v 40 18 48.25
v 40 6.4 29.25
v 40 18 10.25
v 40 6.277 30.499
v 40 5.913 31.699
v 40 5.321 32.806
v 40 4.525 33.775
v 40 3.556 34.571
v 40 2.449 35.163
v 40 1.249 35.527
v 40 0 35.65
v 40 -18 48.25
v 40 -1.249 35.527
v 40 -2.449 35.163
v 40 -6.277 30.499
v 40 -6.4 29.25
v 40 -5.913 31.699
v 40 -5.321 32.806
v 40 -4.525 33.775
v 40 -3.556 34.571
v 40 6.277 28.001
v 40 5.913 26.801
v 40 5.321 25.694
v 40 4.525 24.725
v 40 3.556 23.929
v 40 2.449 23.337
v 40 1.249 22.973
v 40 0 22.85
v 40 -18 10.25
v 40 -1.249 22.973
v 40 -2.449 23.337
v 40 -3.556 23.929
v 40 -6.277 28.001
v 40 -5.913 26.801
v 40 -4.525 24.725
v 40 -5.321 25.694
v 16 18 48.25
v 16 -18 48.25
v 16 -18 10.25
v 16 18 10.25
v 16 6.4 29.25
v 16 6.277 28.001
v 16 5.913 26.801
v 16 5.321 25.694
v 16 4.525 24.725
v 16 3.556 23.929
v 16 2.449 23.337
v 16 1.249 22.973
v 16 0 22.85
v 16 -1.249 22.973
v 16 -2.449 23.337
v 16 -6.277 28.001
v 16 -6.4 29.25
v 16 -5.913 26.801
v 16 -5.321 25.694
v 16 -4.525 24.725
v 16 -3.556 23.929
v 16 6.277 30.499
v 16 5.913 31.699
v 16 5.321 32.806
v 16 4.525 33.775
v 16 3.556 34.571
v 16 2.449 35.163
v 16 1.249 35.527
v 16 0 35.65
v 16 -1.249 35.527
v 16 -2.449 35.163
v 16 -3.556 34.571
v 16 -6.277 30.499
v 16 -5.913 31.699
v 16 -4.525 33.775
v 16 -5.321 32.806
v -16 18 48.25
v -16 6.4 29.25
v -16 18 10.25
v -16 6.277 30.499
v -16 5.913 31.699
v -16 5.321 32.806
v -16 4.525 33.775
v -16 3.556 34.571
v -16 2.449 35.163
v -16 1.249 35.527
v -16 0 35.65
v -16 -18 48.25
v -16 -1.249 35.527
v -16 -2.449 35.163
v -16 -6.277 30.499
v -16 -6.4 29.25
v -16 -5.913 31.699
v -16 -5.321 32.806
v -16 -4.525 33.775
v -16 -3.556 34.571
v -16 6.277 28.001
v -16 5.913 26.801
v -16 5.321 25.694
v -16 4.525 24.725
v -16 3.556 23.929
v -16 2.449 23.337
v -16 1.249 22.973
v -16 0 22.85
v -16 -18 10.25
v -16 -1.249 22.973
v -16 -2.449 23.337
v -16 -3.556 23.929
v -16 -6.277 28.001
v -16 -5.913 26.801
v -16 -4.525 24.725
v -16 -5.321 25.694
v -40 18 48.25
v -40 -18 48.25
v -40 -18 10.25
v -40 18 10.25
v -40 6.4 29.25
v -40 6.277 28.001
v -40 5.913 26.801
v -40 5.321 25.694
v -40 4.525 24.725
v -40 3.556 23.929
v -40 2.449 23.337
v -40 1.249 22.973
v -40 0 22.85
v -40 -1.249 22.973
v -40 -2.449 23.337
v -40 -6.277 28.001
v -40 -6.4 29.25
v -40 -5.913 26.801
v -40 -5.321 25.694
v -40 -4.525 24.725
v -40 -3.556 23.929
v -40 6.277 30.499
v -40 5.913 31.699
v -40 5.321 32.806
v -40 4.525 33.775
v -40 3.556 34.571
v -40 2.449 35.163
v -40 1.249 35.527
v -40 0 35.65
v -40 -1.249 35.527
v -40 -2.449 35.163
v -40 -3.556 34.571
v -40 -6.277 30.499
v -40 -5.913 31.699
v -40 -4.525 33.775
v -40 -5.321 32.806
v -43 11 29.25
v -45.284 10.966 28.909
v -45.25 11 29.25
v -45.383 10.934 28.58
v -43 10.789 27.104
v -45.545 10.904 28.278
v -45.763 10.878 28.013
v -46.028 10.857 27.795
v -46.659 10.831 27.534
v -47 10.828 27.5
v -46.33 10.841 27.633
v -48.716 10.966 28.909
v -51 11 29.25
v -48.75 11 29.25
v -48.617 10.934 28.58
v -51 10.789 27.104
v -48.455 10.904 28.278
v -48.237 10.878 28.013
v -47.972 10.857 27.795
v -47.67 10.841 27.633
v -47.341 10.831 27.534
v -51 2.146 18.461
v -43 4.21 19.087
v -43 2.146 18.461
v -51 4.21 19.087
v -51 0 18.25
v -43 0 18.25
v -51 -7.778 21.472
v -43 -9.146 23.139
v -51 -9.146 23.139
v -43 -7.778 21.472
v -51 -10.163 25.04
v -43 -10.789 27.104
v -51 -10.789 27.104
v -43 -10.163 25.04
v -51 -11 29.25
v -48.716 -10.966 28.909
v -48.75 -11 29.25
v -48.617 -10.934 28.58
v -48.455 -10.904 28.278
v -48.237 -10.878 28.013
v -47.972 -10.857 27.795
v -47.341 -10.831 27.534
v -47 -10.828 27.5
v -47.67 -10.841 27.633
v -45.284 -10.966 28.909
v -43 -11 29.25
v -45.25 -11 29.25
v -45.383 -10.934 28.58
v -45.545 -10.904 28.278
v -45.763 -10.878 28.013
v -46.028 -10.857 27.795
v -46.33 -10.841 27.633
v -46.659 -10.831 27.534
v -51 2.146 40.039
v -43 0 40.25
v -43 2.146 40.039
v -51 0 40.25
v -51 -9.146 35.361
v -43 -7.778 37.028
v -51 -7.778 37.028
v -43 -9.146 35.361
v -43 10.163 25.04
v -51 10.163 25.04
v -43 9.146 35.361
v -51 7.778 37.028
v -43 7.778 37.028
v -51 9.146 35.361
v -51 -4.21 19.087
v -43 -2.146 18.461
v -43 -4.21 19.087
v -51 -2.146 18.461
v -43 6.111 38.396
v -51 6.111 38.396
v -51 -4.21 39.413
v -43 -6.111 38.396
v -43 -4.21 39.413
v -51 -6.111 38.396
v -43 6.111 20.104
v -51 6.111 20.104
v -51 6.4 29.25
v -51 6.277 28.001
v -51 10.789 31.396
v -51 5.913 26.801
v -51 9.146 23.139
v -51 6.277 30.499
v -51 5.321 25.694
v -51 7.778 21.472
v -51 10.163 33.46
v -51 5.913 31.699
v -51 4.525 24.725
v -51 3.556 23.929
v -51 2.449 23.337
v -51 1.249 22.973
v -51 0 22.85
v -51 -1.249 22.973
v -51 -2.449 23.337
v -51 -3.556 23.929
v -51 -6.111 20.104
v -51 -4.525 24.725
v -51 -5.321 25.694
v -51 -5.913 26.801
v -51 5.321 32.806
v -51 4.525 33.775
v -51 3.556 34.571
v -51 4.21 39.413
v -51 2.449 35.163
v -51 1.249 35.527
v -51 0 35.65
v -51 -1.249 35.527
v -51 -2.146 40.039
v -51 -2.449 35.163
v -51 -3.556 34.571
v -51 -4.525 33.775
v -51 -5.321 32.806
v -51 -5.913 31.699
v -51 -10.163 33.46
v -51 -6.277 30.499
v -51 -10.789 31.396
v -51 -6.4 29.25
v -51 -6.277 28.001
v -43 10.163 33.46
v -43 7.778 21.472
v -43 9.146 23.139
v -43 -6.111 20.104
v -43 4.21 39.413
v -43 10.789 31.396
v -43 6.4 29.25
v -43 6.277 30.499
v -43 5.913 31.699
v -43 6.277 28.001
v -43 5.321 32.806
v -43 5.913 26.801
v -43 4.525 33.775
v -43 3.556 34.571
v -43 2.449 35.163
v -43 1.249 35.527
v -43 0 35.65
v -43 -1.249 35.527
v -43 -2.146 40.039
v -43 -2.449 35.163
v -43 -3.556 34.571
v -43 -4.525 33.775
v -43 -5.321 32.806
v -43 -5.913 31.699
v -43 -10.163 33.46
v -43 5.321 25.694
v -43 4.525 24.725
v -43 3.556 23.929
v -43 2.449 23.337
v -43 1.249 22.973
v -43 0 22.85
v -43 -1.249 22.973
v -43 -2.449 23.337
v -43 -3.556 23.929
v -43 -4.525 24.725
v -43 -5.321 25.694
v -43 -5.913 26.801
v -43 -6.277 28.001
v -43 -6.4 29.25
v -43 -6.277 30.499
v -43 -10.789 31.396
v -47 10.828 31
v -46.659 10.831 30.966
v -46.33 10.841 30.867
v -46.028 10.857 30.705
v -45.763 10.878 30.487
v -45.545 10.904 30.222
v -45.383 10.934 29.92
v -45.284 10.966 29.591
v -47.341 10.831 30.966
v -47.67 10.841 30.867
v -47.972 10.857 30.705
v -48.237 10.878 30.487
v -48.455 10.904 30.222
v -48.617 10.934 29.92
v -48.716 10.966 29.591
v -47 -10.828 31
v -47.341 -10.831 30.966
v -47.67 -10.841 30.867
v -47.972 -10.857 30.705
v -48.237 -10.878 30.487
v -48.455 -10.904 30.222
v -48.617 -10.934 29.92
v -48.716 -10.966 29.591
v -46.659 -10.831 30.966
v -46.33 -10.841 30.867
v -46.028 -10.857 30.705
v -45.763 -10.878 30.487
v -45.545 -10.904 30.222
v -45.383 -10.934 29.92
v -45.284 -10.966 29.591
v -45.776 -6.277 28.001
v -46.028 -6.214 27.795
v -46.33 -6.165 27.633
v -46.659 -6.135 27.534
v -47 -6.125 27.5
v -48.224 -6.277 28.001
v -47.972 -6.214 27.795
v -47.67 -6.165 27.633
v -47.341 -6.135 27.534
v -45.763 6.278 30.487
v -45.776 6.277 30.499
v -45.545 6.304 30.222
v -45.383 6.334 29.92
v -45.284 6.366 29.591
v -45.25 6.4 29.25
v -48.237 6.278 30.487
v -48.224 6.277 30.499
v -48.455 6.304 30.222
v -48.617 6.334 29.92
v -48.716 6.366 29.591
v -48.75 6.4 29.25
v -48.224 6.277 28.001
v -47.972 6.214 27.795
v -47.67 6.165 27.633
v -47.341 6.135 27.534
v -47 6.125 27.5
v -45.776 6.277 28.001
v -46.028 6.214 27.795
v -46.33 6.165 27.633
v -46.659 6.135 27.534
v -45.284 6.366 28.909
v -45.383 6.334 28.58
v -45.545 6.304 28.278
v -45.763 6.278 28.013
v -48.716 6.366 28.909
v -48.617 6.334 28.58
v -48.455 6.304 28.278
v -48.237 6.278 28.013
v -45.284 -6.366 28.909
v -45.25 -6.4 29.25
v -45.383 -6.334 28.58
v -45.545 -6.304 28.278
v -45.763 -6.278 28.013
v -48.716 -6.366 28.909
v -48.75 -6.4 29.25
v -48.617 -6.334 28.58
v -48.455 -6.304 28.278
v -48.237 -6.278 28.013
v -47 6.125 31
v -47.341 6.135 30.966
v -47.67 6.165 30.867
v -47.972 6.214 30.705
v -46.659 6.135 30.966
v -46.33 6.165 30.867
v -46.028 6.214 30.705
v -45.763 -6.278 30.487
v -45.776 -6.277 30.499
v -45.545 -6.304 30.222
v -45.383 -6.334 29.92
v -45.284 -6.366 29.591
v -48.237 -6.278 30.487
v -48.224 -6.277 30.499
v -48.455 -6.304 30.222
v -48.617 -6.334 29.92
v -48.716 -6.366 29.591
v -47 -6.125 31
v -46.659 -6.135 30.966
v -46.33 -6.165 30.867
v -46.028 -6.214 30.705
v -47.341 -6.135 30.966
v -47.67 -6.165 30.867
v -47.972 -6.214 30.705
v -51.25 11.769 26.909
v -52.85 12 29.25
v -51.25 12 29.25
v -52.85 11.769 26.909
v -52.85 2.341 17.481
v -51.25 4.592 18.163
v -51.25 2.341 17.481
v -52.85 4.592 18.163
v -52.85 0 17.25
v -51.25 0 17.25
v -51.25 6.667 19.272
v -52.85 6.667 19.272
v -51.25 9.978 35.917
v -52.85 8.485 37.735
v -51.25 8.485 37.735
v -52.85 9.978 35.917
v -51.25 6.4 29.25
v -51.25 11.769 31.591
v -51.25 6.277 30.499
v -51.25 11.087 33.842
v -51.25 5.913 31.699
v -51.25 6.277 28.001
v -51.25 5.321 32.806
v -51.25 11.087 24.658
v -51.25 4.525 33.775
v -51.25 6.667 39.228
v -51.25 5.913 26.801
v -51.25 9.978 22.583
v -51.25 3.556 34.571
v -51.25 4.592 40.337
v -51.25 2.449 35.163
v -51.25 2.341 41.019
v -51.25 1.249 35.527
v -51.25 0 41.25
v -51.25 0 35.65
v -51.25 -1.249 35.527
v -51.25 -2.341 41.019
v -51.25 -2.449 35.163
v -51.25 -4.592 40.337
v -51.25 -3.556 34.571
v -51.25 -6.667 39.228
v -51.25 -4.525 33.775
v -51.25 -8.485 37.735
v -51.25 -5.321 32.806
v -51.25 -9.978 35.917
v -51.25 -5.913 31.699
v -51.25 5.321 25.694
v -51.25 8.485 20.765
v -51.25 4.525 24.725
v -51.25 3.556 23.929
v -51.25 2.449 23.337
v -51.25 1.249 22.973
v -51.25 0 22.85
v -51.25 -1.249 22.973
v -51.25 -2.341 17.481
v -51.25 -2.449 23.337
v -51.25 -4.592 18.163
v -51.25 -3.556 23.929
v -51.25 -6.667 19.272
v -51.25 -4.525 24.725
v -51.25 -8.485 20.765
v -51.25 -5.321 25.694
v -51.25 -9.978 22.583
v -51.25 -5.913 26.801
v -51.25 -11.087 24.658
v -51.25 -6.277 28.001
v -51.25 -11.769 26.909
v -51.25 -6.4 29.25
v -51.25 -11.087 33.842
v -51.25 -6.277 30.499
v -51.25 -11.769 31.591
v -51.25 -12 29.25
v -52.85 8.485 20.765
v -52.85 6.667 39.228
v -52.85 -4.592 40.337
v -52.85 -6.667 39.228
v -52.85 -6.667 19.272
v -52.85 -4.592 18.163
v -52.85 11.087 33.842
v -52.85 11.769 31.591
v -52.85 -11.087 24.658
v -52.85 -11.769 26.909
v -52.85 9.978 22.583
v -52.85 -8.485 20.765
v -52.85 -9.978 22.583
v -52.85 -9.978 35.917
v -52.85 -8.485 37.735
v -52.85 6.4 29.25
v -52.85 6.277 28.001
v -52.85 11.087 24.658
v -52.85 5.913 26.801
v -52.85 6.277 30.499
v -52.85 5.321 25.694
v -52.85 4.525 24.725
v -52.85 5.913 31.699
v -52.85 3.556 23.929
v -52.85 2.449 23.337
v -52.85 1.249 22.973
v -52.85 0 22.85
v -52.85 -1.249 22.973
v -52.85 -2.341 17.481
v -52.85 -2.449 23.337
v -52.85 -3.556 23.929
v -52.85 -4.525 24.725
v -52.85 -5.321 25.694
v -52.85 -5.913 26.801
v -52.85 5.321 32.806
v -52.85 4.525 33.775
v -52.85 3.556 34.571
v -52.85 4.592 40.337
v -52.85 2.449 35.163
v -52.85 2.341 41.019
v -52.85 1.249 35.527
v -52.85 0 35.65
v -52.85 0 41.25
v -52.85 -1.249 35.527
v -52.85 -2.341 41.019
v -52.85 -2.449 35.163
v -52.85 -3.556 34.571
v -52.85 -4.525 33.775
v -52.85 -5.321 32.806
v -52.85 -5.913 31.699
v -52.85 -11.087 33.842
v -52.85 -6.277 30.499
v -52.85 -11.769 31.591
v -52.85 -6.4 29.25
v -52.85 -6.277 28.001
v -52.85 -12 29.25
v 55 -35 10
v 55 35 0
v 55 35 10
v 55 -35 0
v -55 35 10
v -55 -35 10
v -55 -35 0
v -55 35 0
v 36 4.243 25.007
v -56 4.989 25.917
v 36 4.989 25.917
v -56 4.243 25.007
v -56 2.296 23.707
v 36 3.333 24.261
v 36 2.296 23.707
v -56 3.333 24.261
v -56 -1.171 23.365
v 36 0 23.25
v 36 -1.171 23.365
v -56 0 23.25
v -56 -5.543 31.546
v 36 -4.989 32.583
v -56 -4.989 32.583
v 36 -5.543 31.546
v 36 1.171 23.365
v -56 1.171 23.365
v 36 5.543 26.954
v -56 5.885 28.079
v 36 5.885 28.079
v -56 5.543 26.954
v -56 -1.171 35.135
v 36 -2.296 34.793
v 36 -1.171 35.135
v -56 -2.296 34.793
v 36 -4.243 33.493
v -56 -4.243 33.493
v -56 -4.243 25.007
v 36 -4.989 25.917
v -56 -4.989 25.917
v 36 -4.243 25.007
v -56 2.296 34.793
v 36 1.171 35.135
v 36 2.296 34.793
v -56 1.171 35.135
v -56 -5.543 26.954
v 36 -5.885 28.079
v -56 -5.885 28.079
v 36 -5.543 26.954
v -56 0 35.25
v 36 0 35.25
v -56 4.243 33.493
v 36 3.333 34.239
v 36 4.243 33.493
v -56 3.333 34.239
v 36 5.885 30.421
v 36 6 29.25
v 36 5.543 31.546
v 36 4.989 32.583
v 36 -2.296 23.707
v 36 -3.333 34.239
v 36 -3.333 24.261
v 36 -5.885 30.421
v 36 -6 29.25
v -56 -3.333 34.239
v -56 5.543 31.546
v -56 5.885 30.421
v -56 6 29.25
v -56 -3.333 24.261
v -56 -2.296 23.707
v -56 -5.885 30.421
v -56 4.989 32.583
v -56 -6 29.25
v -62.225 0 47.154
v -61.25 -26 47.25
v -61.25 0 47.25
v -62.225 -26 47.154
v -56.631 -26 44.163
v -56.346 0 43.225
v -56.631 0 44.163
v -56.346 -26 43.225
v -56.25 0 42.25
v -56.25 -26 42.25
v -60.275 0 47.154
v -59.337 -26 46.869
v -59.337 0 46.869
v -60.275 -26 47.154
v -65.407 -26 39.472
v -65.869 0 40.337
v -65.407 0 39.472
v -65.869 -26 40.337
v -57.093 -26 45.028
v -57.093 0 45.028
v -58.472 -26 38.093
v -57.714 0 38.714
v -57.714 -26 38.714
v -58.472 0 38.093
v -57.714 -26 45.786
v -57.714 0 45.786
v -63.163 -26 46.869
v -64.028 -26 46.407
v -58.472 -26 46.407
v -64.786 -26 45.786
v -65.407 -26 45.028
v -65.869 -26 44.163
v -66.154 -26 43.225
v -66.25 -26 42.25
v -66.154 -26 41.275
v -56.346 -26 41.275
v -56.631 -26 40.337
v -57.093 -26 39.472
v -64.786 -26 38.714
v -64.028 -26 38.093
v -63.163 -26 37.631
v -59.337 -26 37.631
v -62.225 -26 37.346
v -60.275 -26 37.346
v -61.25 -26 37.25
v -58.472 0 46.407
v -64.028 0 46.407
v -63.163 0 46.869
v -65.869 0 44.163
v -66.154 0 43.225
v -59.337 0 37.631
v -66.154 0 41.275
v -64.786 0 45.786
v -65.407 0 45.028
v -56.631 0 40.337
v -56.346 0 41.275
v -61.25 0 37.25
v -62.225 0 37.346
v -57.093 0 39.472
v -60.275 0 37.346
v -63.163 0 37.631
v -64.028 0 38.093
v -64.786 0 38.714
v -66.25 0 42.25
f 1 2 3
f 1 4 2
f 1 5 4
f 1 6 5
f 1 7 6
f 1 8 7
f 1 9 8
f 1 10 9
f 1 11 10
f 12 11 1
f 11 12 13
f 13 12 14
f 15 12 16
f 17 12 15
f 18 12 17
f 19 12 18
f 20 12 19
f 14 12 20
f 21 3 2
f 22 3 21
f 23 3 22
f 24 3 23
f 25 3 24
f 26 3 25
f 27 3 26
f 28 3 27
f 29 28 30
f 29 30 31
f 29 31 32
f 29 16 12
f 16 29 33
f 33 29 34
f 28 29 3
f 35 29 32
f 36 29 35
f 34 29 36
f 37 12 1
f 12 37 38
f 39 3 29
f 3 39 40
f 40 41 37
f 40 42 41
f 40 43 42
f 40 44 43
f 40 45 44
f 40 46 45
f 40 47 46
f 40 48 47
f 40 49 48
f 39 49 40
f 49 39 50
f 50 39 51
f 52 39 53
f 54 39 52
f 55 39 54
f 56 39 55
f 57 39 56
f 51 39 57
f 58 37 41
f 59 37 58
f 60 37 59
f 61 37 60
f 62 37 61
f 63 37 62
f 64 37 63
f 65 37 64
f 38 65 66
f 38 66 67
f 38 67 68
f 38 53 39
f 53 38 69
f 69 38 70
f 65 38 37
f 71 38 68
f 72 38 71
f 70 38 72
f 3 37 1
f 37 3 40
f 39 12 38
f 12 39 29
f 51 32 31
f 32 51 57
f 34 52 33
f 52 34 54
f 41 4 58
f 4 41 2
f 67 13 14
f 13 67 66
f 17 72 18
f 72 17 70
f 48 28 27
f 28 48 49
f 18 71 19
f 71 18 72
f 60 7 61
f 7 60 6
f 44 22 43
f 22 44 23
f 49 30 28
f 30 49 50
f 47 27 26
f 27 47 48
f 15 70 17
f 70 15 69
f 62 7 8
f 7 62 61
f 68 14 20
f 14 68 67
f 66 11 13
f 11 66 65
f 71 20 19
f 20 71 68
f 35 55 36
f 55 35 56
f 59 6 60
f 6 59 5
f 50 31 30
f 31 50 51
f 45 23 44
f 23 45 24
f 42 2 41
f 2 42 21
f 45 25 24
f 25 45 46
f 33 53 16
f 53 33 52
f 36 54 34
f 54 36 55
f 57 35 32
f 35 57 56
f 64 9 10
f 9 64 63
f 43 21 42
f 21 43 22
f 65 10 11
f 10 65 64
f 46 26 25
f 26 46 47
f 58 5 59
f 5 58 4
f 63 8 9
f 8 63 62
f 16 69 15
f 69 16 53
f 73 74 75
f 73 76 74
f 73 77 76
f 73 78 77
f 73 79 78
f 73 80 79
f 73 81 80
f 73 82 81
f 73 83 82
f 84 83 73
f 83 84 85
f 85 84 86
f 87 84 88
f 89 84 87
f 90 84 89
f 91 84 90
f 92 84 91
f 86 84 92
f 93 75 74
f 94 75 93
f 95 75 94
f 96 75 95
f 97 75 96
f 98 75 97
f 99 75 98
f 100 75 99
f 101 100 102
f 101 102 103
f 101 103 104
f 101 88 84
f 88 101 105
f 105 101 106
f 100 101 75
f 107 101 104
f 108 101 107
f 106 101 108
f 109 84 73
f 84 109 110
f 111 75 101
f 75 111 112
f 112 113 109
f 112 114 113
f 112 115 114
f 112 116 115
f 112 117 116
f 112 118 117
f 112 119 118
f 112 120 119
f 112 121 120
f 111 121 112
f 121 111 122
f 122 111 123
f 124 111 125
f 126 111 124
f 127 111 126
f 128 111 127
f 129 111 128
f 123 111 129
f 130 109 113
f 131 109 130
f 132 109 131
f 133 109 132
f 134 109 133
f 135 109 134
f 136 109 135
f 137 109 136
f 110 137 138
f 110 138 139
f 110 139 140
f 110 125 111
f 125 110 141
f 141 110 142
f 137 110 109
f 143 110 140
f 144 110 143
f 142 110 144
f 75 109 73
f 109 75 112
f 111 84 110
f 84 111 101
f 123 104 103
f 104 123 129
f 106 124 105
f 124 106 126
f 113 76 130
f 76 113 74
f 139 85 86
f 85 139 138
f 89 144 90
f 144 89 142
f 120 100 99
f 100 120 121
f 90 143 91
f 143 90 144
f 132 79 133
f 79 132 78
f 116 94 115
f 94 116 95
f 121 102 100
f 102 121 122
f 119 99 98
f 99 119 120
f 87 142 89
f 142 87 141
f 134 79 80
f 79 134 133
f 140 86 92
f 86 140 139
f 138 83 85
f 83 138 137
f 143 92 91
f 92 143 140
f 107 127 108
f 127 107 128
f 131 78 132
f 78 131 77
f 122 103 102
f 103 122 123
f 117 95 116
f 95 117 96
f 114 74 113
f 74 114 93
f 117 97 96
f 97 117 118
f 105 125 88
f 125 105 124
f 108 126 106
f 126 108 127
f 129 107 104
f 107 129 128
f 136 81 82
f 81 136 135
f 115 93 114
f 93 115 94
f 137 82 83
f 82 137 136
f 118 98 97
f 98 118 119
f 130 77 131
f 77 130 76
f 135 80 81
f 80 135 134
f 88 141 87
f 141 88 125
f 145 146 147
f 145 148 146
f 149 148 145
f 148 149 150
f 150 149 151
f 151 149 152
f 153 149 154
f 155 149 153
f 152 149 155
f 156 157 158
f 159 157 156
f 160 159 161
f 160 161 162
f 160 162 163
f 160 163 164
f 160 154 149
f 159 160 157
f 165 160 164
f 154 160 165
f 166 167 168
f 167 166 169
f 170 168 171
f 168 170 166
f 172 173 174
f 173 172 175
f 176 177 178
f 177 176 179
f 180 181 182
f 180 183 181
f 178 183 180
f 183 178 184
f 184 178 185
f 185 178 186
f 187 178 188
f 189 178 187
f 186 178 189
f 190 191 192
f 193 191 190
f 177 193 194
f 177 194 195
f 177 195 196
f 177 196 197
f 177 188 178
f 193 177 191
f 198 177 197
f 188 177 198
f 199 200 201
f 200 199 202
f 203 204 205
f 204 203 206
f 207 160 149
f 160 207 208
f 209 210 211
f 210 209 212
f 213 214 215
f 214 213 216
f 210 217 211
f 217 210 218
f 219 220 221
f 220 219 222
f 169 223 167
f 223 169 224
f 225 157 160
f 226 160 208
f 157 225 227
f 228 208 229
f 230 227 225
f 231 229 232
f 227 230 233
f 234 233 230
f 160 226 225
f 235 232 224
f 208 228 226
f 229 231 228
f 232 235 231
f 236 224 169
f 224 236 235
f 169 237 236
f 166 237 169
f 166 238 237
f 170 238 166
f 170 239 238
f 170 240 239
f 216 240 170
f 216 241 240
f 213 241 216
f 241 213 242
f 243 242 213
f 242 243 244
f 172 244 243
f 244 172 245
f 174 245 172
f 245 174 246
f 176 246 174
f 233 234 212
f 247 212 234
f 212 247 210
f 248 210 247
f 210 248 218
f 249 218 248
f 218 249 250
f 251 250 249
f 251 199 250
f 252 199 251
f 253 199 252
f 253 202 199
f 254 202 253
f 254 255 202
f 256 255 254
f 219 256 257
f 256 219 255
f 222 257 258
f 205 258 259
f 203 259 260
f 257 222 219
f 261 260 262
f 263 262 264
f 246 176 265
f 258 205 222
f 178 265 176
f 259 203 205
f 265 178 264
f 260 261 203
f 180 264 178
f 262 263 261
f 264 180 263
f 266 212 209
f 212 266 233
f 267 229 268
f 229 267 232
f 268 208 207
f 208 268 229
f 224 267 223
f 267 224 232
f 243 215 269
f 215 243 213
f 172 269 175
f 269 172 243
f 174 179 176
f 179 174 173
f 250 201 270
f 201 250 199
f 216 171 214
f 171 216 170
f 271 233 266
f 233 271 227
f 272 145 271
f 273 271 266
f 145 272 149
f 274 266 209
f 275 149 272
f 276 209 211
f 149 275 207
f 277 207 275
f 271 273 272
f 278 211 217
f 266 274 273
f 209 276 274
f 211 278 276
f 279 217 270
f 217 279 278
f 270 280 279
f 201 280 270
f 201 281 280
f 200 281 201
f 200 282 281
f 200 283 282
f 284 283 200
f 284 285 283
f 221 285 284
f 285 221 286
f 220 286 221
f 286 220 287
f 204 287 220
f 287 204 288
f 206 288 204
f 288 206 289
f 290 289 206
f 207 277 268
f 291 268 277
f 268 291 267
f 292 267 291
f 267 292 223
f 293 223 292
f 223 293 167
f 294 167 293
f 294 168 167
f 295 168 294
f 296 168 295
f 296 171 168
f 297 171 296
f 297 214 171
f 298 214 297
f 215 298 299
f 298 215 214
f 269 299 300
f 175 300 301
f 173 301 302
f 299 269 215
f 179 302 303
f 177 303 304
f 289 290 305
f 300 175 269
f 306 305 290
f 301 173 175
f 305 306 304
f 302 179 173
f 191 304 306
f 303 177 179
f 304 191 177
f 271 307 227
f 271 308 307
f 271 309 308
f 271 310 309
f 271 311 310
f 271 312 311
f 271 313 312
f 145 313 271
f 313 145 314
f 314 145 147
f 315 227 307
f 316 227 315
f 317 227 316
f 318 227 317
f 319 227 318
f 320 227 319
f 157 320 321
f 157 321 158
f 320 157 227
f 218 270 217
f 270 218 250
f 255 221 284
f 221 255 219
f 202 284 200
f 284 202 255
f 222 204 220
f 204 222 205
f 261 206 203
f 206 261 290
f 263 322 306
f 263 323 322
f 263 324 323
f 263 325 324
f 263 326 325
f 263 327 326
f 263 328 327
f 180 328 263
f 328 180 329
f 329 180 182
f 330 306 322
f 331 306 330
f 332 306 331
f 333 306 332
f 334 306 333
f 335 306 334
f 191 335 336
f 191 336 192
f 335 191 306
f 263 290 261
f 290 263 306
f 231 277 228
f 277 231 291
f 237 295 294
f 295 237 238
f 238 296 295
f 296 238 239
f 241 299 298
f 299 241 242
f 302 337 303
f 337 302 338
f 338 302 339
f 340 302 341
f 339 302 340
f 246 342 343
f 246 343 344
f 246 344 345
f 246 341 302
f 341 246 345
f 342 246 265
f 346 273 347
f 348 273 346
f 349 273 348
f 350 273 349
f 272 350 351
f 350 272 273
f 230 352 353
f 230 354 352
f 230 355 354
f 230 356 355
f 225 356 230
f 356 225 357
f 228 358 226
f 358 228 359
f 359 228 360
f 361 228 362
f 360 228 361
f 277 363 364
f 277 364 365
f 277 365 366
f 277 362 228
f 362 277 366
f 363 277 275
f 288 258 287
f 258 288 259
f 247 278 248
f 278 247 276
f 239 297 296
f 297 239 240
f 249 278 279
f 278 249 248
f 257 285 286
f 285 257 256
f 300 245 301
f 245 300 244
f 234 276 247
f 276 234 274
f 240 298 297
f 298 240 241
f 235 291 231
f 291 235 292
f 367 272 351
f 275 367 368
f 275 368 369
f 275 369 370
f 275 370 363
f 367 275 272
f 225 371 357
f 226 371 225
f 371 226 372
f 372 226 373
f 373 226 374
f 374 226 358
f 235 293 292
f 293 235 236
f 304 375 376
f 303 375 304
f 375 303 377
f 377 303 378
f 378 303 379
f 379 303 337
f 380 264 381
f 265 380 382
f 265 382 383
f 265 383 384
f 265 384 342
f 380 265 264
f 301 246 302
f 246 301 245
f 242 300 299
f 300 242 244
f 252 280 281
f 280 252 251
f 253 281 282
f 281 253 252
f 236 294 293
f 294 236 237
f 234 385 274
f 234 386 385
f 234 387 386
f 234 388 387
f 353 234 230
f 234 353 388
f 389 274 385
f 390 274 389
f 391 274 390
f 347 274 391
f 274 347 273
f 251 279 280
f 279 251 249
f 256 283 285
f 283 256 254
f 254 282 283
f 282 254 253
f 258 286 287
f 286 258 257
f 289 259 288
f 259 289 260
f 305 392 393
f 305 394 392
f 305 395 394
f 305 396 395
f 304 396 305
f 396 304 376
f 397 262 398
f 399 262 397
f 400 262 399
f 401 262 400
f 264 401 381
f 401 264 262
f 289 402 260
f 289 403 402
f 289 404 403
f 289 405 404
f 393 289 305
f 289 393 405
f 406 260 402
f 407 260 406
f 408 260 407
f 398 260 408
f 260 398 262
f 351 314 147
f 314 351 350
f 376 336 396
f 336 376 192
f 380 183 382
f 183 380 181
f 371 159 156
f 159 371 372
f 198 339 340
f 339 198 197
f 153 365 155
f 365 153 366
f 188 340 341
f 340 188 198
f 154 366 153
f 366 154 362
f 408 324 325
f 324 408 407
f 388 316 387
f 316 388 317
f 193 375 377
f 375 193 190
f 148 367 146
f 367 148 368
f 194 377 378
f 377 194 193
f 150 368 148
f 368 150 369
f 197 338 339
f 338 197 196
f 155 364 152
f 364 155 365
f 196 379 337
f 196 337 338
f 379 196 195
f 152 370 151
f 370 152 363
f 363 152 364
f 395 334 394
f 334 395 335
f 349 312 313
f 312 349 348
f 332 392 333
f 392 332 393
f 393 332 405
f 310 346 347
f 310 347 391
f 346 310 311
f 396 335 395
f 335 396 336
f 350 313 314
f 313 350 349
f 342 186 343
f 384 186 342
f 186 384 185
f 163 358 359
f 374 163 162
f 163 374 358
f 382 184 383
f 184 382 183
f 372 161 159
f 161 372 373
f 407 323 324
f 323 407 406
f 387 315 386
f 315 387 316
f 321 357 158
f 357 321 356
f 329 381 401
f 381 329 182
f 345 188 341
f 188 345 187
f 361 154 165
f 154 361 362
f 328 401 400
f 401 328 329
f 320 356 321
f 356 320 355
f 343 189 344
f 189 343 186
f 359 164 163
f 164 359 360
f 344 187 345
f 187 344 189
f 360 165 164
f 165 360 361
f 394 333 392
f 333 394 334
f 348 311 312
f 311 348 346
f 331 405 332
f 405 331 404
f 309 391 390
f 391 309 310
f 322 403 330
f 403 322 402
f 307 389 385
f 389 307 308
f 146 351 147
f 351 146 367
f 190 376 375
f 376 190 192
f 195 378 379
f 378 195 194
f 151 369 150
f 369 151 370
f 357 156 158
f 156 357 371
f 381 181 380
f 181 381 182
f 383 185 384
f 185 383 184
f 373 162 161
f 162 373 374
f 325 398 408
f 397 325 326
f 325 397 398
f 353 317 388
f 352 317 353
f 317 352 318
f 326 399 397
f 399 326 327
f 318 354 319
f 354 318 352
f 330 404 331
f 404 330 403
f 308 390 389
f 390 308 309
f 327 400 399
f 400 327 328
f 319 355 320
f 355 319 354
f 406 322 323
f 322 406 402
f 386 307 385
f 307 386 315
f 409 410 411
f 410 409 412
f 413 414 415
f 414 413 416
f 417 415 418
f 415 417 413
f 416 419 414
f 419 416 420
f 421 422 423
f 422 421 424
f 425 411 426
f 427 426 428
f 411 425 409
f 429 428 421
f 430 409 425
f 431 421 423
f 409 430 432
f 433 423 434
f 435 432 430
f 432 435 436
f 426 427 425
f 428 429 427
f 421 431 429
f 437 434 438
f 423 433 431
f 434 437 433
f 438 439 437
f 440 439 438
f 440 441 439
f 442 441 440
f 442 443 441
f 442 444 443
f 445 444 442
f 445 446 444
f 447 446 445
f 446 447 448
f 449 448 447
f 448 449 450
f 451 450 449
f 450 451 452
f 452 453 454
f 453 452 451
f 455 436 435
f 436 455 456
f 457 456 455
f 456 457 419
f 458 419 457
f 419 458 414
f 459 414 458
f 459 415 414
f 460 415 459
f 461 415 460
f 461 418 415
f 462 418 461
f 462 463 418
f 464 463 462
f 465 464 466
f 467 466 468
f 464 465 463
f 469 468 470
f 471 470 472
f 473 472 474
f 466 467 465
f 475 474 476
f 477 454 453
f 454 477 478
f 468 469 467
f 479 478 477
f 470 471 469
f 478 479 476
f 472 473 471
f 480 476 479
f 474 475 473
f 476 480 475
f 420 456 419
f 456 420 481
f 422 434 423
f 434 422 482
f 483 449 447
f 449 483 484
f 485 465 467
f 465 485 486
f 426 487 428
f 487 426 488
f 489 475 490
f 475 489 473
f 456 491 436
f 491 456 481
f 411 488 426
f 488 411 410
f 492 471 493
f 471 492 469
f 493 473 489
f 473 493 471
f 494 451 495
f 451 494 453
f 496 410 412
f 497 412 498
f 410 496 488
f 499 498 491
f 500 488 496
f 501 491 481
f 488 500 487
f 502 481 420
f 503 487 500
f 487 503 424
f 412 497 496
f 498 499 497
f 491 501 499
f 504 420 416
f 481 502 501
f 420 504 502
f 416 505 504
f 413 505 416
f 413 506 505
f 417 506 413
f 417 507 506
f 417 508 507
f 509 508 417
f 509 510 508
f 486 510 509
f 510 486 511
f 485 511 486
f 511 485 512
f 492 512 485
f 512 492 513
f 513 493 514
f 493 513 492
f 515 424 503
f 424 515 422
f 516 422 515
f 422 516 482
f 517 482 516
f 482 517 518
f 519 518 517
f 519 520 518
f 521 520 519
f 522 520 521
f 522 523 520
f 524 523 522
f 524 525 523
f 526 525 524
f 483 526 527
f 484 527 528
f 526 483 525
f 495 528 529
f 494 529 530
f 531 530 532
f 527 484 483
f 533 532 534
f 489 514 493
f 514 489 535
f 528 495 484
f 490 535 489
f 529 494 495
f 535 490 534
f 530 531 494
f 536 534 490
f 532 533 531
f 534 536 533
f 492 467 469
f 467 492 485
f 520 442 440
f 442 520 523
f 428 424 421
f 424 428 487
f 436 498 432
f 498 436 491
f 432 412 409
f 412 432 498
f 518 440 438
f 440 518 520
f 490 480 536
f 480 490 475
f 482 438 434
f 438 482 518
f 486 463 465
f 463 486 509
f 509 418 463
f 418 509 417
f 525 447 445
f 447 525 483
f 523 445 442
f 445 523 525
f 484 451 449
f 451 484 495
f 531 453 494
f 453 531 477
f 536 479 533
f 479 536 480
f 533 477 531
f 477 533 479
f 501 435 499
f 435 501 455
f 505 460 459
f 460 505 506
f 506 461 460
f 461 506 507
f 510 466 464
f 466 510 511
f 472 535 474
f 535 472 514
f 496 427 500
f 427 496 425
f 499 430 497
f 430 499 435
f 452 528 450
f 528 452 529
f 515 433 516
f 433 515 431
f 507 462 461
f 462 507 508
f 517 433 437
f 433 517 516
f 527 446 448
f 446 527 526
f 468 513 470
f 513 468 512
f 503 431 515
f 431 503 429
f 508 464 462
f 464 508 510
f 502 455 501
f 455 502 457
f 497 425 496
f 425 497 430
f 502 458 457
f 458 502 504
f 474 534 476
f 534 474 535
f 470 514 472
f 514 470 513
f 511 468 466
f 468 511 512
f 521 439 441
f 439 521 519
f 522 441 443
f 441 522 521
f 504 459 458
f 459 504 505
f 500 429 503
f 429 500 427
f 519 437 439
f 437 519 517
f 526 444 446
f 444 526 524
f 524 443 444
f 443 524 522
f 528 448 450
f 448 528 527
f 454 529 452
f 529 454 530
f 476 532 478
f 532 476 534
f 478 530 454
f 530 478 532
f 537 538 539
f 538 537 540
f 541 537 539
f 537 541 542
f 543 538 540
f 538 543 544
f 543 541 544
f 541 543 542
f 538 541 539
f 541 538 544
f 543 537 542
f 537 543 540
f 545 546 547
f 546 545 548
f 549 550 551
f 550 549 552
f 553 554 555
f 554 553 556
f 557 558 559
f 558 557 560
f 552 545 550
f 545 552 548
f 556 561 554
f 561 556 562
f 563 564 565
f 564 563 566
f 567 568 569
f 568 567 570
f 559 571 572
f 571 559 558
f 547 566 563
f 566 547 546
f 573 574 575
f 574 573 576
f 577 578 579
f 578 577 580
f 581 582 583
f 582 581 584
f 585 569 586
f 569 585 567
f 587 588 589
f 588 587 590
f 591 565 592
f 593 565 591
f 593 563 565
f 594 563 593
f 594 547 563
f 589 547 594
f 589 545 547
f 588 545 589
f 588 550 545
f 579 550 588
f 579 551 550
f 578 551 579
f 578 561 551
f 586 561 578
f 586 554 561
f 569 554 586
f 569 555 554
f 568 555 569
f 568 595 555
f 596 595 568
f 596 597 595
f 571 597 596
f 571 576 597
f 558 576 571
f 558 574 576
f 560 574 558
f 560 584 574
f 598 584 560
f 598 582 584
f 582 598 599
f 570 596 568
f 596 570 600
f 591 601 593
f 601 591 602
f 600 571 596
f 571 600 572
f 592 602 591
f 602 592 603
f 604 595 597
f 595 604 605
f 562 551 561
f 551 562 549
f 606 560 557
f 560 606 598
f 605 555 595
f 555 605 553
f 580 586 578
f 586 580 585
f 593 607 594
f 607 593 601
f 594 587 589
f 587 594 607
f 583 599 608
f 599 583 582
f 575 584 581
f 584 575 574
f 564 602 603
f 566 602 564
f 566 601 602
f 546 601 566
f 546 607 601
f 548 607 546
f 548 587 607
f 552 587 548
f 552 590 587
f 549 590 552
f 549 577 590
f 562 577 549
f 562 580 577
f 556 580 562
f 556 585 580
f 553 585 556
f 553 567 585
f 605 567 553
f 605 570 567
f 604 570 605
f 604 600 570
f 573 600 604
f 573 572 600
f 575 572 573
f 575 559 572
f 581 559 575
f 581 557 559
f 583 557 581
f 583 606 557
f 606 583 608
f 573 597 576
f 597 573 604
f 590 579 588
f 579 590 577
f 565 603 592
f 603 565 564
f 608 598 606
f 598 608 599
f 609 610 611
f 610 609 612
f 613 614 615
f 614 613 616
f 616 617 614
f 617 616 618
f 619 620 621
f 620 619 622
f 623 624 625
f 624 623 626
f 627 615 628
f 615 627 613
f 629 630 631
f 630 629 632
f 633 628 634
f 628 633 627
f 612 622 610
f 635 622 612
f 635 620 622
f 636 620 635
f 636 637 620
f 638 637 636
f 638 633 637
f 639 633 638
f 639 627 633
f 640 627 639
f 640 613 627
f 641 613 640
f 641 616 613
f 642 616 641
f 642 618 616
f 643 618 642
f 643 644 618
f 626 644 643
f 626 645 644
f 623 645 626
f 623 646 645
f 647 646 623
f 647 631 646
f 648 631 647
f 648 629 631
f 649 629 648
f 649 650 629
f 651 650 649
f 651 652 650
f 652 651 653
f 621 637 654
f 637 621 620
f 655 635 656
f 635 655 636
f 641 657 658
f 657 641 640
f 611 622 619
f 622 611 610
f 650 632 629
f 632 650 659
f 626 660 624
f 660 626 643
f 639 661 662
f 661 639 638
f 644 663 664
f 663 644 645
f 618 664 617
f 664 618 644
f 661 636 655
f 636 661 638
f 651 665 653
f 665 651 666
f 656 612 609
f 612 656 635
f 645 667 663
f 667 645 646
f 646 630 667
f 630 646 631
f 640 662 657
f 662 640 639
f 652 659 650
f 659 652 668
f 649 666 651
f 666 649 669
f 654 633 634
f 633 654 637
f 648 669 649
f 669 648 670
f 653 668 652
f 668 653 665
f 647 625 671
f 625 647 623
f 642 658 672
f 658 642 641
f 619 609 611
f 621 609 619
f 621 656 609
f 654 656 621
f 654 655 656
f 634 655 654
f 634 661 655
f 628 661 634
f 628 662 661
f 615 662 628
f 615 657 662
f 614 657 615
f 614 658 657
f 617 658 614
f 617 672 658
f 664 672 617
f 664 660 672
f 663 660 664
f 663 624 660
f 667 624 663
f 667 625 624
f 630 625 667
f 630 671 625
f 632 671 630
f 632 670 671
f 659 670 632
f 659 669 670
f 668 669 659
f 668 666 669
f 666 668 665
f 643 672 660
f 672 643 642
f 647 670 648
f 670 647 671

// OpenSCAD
$fn = 32;

// ------------------------------------------------------------------------
// Machine vise: screw d12, jaws 24 x 38 mm
// Every part is its own module, assembly() places every instance.
// ------------------------------------------------------------------------

// --- part 1 ---
module vise_bed() {
  difference() {
    translate([-55, -35, 0]) cube([110, 70, 10]);
  }
}

// --- part 2 ---
module vise_jaw() {
  difference() {
    translate([-12, -18, 0]) cube([24, 36, 38]);
    translate([0, 0, 19]) rotate([0, 90, 0]) cylinder(h = 26, d = 12.8, center = true);
  }
}

// --- part 3 ---
module vise_screw() {
  translate([0, 0, -46]) cylinder(h = 92, d = 12);
}

// --- part 4 ---
module screw_collar() {
  difference() {
    cylinder(h = 8, d = 22);
    translate([0, 0, -1]) cylinder(h = 10, d = 12.8);
    translate([0, 0, 4]) rotate([90, 0, 0]) cylinder(h = 24, d = 3.5, center = true);
  }
}

// --- part 5 ---
module screw_washer() {
  difference() {
      translate([0, 0, 0]) cylinder(h = 1.6, d = 24);
      translate([0, 0, -1]) cylinder(h = 3.6, d = 12.8);
    }
}

// --- part 6 ---
module vise_handle() {
  cylinder(h = 26, d = 10);
}

// --- assembly ---
module assembly() {
  color([0.80, 0.24, 0.20]) translate([0, 0, 0]) rotate([0, 0, 0]) vise_bed();
  color([0.20, 0.45, 0.75]) translate([28, 0, 10.25]) rotate([0, 0, 0]) vise_jaw();
  color([0.25, 0.62, 0.32]) translate([-28, 0, 10.25]) rotate([0, 0, 0]) vise_jaw();
  color([0.92, 0.70, 0.18]) translate([-10, 0, 29.25]) rotate([0, 90, 0]) vise_screw();
  color([0.58, 0.35, 0.70]) translate([-51, 0, 29.25]) rotate([0, 90, 0]) screw_collar();
  color([0.16, 0.66, 0.66]) translate([-52.85, 0, 29.25]) rotate([0, 90, 0]) screw_washer();
  color([0.85, 0.48, 0.18]) translate([-61.25, 0, 42.25]) rotate([90, 0, 0]) vise_handle();
}

assembly();
